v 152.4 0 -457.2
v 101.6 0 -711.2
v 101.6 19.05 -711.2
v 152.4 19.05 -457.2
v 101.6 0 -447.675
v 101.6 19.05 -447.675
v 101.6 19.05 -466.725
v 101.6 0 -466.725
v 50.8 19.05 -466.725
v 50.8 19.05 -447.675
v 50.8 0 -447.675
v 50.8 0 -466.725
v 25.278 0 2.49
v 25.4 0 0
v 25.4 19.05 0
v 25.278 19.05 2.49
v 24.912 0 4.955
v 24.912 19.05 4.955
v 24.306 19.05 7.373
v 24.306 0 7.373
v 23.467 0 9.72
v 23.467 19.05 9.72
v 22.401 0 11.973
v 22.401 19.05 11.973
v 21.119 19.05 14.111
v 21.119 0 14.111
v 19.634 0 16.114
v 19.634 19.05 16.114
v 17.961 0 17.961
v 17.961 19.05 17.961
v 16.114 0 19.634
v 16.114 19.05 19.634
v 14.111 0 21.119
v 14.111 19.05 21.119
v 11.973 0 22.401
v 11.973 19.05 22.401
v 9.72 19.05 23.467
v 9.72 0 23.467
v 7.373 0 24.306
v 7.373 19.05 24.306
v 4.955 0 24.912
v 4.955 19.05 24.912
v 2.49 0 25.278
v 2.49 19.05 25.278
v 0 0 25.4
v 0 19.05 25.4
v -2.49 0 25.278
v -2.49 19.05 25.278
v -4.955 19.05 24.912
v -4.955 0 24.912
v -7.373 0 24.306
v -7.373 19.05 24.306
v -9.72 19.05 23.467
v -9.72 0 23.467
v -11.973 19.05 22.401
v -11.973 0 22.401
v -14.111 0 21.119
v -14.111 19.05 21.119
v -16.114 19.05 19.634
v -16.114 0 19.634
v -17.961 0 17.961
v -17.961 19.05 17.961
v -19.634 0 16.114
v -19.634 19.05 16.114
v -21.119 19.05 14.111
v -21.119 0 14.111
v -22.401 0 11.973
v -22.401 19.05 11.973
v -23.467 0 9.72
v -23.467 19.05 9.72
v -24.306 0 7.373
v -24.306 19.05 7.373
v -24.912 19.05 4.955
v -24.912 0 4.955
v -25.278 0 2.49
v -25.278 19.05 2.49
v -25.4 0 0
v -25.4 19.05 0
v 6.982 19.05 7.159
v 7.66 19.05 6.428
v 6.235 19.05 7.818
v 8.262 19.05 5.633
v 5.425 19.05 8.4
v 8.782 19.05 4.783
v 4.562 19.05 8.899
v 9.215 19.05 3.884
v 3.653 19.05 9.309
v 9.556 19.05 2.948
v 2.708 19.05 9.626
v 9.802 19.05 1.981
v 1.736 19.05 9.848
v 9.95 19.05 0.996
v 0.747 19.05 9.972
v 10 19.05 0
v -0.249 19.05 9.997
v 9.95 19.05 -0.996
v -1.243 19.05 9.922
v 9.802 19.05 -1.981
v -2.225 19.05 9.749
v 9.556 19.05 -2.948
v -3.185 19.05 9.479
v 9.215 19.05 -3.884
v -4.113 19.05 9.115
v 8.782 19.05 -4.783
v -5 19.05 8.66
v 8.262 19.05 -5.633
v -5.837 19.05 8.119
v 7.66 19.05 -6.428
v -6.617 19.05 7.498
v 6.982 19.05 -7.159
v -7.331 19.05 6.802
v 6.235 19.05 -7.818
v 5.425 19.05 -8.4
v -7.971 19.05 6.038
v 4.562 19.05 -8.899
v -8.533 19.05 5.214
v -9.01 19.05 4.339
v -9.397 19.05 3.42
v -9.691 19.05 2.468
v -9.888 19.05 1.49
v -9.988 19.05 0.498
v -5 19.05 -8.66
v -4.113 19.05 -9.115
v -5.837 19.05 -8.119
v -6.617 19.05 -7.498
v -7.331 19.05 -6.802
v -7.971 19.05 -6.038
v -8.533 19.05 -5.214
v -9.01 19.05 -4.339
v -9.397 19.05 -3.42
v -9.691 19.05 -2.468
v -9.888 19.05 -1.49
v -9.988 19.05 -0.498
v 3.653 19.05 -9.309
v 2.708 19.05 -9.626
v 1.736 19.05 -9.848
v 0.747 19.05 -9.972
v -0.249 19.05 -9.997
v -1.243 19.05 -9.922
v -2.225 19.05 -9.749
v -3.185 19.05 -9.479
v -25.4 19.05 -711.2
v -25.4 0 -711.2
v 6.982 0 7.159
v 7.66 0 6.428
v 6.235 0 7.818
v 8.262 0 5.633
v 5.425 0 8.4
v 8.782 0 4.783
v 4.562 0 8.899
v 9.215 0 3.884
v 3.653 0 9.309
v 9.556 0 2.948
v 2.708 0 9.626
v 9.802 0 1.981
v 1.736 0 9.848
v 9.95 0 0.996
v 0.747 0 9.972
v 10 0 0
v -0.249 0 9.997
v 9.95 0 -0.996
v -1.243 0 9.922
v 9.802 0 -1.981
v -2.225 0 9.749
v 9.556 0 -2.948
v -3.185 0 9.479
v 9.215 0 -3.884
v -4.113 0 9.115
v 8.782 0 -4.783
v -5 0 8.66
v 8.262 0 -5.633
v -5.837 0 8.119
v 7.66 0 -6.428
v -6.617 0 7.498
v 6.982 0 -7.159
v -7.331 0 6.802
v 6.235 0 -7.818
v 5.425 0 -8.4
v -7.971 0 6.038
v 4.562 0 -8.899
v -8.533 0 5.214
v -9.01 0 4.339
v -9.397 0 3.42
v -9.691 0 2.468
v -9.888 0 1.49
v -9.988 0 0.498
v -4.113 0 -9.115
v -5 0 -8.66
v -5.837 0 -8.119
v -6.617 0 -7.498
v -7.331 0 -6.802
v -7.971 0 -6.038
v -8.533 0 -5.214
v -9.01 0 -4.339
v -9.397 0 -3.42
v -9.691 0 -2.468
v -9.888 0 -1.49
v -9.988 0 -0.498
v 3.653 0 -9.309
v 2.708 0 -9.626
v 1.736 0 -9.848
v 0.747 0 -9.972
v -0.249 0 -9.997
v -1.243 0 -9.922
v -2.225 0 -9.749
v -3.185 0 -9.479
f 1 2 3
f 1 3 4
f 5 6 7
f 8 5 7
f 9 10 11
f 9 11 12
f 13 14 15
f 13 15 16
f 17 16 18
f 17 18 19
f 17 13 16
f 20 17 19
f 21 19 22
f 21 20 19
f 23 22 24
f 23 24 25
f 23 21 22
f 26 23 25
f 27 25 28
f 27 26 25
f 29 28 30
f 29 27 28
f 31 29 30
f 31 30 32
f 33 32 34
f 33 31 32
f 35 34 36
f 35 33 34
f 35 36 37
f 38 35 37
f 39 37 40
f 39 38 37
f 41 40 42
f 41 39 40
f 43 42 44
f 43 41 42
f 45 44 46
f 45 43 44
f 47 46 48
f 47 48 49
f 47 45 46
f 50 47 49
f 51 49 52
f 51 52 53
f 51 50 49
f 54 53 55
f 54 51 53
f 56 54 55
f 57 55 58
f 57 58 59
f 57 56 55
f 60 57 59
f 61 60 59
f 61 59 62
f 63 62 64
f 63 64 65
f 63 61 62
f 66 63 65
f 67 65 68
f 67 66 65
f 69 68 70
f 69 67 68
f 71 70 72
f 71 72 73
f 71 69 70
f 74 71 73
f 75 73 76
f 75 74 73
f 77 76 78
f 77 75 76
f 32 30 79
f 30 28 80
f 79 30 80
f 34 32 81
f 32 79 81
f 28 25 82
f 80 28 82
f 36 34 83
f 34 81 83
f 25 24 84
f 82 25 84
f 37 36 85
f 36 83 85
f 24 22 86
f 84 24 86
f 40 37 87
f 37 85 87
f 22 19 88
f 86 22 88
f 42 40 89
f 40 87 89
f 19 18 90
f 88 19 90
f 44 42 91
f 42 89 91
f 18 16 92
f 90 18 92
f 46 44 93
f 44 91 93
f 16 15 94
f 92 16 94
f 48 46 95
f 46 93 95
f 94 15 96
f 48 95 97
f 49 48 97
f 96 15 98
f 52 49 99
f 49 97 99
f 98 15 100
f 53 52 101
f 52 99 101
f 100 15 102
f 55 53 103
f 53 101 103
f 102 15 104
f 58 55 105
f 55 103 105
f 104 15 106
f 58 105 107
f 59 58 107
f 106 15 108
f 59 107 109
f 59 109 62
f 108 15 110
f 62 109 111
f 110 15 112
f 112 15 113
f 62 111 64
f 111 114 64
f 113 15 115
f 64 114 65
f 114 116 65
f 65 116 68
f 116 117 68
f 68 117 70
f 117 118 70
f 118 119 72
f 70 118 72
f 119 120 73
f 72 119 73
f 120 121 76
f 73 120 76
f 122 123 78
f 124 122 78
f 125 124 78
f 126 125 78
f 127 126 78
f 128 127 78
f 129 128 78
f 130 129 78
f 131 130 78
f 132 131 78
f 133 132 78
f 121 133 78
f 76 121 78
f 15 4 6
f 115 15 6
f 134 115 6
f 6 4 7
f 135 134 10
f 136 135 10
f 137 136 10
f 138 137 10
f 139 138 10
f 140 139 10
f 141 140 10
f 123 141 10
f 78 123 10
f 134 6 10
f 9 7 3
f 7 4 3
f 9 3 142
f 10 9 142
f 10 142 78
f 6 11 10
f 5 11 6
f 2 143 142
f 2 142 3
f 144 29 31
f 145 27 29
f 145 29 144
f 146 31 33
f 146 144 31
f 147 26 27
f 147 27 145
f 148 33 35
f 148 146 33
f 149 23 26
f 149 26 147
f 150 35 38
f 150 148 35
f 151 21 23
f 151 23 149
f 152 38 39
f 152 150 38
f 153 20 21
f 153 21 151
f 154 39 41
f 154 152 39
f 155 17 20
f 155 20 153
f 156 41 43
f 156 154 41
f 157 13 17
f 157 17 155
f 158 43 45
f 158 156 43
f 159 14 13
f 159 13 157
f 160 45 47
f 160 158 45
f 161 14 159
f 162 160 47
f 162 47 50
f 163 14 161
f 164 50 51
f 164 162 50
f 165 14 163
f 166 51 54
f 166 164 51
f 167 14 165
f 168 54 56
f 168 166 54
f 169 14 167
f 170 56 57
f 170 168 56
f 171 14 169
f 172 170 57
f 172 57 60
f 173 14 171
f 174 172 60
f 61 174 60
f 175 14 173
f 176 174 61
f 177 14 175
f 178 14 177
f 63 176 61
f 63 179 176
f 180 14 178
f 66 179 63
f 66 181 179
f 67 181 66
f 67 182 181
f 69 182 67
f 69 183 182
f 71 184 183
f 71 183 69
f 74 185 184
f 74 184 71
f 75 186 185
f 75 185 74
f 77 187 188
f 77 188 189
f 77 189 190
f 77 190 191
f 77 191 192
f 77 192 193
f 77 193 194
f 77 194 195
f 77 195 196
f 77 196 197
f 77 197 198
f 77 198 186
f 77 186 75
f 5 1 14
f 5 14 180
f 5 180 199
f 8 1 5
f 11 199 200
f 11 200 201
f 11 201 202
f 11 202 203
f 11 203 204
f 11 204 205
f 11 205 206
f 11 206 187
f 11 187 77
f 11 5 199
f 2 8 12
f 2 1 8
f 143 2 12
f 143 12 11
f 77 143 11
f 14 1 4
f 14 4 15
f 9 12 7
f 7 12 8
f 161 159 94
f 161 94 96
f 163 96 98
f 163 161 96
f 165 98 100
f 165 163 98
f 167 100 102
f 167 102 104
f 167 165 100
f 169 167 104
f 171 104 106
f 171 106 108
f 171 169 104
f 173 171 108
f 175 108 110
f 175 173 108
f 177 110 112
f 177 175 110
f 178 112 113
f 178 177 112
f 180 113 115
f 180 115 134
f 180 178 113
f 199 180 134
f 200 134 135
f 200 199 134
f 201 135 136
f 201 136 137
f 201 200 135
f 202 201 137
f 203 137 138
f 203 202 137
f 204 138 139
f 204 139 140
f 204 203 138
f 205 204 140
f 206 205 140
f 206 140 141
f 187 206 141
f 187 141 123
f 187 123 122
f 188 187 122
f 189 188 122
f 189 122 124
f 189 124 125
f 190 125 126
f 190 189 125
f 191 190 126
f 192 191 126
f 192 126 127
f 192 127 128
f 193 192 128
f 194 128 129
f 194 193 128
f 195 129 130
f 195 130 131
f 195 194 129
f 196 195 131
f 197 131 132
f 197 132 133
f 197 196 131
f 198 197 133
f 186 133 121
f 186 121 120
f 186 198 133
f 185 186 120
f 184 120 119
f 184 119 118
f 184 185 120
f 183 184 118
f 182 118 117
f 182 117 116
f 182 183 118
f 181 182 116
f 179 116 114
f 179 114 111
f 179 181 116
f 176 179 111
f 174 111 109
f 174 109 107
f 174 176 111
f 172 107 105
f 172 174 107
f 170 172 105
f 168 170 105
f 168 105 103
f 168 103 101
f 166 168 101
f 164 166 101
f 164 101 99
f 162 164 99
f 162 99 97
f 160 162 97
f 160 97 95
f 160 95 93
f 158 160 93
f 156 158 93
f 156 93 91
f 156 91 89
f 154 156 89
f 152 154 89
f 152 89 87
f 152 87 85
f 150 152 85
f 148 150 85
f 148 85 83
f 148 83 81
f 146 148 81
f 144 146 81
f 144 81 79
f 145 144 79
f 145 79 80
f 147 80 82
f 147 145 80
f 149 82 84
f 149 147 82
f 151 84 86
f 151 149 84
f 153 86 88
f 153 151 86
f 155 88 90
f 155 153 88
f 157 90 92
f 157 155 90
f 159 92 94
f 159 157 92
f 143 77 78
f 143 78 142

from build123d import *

# Parameters (mm, degrees)
SKETCH1_R           = 10
SKETCH1_W           = 50.8
SKETCH1_H           = 19.05
BOSS_EXTRUDE1_DEPTH = 19.05


with BuildPart() as part:
    # Sketch1 → Boss-Extrude1 (new body)
    with BuildSketch(Plane(origin=(0, 0, 0), x_dir=(1, 0, 0), z_dir=(0, 1, 0))):
        with BuildLine():
            Line((-25.4, 0), (-25.4, 711.2))
            Line((-25.4, 711.2), (101.6, 711.2))
            Line((101.6, 711.2), (152.4, 457.2))
            Line((152.4, 457.2), (25.4, 0))
            ThreePointArc((25.4, 0), (0, -25.4), (-25.4, 0))
        make_face()
        Circle(SKETCH1_R, mode=Mode.SUBTRACT)
        with Locations((76.2, 457.2)):
            Rectangle(SKETCH1_W, SKETCH1_H, mode=Mode.SUBTRACT)
    extrude(amount=BOSS_EXTRUDE1_DEPTH)


solid = part.part
